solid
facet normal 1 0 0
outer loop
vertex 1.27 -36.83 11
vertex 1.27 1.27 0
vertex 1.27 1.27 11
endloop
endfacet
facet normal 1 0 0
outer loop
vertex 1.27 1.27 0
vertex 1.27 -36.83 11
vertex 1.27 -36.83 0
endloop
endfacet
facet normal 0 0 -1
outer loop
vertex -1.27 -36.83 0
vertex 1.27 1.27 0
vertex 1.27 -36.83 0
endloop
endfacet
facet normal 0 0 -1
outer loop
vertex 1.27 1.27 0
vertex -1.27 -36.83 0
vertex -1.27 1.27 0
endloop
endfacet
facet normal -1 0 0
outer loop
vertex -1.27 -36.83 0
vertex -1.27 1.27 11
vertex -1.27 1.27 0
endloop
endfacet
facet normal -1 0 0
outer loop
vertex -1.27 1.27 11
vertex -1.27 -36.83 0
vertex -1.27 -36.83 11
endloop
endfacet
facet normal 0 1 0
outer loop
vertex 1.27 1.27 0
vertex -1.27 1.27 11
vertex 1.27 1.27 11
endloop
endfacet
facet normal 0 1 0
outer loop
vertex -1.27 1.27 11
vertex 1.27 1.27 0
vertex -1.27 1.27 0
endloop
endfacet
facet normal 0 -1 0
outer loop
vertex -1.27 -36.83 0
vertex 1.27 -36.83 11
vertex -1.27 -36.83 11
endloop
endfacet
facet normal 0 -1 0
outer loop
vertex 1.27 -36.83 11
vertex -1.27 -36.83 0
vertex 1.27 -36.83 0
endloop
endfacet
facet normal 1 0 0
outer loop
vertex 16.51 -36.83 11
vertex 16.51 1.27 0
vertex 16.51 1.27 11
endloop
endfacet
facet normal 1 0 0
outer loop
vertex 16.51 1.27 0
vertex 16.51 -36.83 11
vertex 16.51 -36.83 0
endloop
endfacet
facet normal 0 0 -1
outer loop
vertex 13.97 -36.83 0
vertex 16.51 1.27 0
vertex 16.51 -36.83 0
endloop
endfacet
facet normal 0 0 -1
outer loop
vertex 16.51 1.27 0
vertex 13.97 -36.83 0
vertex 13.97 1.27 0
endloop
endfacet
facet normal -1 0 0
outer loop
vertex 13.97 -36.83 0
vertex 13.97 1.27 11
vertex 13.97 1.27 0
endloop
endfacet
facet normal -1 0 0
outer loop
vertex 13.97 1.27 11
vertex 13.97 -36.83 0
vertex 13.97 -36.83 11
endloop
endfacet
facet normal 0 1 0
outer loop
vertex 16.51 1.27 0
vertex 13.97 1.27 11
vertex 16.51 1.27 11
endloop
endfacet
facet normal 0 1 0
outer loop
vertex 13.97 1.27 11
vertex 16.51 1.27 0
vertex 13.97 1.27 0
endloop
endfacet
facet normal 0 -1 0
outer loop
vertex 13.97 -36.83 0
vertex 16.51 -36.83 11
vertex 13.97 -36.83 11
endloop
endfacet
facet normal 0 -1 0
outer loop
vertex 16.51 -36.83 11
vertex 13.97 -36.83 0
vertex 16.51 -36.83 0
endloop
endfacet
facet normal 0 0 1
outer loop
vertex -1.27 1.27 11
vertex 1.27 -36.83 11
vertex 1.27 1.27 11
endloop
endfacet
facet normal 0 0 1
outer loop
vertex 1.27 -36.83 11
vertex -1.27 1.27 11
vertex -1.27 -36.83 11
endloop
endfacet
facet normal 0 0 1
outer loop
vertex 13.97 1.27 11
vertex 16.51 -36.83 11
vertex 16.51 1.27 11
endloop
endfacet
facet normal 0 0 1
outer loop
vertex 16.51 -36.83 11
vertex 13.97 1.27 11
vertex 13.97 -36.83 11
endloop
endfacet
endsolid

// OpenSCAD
// Arduino Nano (U1) plugged into two 15-way PBS socket strips. Made for 3d/populated: the KiCad model
// Module.3dshapes/Arduino_Nano_WithMountingHoles.step is not on this machine, which is why the board's own
// footprint draws only the Nano's outline.
//
// layers: strip=#1b1b1d pcb=#12508a chip=#1e1e20 steel=#c4c8cc gold=#d1ad45 tact=#2c2c2e pins=#c9c9c9
//
// FRAME  KiCad model frame of the base footprint TS06_Arduino_Nano: pin 1 at (0, 0), column 1 down the page
//        (model y 0 .. -35.56), column 2 at x 15.24; USB end at +y. The board's U1 is the _R90 copy and gets there
//        through tools/models3d.py's variant rule.
//
// DIMENSIONS                          value                        kind
//   pin rows / pitch               15.24 x 2.54 mm, 15 pins each     MEASURED (repo source): TS06_Arduino_Nano.kicad_mod pads
//   Nano PCB                        17.78 x 43.18 x 1.6 mm           MEASURED (repo source): the footprint's F.Fab rectangle
//                                                                    (x -1.27..16.51, y -3.81..41.91 incl. the 2.54 mm the USB
//                                                                    shell overhangs); thickness case_pair.py NANO_PCB_T 1.6 (assumed there)
//   PBS strips                      2.54 x 38.1 x 8.5 mm            MEASURED (repo source): PCB/TS06-DRV/bom.md, "Socket strip PBS-15, 8.5 mm"
//   male header body under the Nano 2.5 mm                           MEASURED (repo source): case_pair.py PLS_BODY 2.5 (PCB/TS06-DISP/bom.md "8.5 PBS + 2.5 PLS body")
//   mini-B receptacle               7.7 w x 9.2 l x 4.0 h, 2.54 proud of the PCB end   INFERRED: case_pair.py USB_W / USB_L / USB_H (assumed there);
//                                                                    the proud 2.54 is the F.Fab overhang
//   ATmega328P TQFP-32 7 x 7 x 1.0; USB-UART SOIC-16 10 x 4 x 1.6; reset switch 3.5 x 6 x 2.5   INFERRED (typical, positions approximate)
//   overall height                  16.6 mm above the board face     DERIVED: 8.5 + 2.5 + 1.6 + 4.0; matches case_pair.py NANO_H
//   not drawn: the ICSP header (the pads are shown unpopulated, as most Nanos ship), crystal, regulator, LEDs, mounting holes
L = "strip";
P = 2.54;
STRIP_H = 8.5;
PLS_H = 2.5;
PCB_Z = STRIP_H + PLS_H;            // 11.0
PCB_T = 1.6;
TOP = PCB_Z + PCB_T;                // 12.6

module strip(x) translate([x - 1.27, -35.56 - 1.27, 0]) cube([2.54, 15 * P, STRIP_H]);
module plsbody(x) translate([x - 1.27, -35.56 - 1.27, STRIP_H]) cube([2.54, 15 * P, PLS_H]);

if (L == "strip") { strip(0); strip(15.24); plsbody(0); plsbody(15.24); }
if (L == "pcb") translate([-1.27, -41.91, PCB_Z]) cube([17.78, 41.91 + 1.27, PCB_T]);
// mini-B shell: 7.7 wide centred on the PCB, from y 3.81 (the overhang's end) back 9.2 mm
if (L == "steel") translate([7.62 - 3.85, 3.81 - 9.2, TOP]) cube([7.7, 9.2, 4.0]);
if (L == "chip") {
    translate([7.62 - 3.5, -27.0 - 3.5, TOP]) cube([7, 7, 1.0]);                    // ATmega328P, TQFP-32
    translate([7.62 - 2.0, -9.0 - 5.0, TOP]) cube([4, 10, 1.6]);                    // USB-UART, SOIC-16
}
if (L == "tact") translate([7.62 - 1.75, -17.5 - 3.0, TOP]) cube([3.5, 6, 2.5]);   // reset switch
if (L == "gold") for (i = [0 : 2], j = [0 : 1]) translate([6.35 + j * 2.54, -36.0 - i * 2.54, TOP + 0.01]) cylinder(d = 1.7, h = 0.04, $fn = 16);
if (L == "pins") for (x = [0, 15.24], i = [0 : 14]) translate([x, -i * P, -2.9]) cylinder(d = 0.65, h = 2.9 + 1.0, $fn = 10);
